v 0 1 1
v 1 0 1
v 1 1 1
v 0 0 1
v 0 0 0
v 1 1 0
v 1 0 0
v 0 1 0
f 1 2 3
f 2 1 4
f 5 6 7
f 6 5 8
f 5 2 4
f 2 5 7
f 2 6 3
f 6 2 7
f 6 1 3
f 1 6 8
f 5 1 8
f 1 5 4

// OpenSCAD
// Test precision issues during transformations

// test Resize --> resize has an internal transformation. this should be empty
difference() {
  resize([10,10,10]) cube([5,40,43]);
  cube([10,10,10]);
}

// Test rotate(), shoud be blank, but it isn't
translate([20,0]) 
difference() {
  rotate([360,0,0]) cube([10,10,10]);
  cube([10,10,10]);
}

// have something for the image for reference
cube();
